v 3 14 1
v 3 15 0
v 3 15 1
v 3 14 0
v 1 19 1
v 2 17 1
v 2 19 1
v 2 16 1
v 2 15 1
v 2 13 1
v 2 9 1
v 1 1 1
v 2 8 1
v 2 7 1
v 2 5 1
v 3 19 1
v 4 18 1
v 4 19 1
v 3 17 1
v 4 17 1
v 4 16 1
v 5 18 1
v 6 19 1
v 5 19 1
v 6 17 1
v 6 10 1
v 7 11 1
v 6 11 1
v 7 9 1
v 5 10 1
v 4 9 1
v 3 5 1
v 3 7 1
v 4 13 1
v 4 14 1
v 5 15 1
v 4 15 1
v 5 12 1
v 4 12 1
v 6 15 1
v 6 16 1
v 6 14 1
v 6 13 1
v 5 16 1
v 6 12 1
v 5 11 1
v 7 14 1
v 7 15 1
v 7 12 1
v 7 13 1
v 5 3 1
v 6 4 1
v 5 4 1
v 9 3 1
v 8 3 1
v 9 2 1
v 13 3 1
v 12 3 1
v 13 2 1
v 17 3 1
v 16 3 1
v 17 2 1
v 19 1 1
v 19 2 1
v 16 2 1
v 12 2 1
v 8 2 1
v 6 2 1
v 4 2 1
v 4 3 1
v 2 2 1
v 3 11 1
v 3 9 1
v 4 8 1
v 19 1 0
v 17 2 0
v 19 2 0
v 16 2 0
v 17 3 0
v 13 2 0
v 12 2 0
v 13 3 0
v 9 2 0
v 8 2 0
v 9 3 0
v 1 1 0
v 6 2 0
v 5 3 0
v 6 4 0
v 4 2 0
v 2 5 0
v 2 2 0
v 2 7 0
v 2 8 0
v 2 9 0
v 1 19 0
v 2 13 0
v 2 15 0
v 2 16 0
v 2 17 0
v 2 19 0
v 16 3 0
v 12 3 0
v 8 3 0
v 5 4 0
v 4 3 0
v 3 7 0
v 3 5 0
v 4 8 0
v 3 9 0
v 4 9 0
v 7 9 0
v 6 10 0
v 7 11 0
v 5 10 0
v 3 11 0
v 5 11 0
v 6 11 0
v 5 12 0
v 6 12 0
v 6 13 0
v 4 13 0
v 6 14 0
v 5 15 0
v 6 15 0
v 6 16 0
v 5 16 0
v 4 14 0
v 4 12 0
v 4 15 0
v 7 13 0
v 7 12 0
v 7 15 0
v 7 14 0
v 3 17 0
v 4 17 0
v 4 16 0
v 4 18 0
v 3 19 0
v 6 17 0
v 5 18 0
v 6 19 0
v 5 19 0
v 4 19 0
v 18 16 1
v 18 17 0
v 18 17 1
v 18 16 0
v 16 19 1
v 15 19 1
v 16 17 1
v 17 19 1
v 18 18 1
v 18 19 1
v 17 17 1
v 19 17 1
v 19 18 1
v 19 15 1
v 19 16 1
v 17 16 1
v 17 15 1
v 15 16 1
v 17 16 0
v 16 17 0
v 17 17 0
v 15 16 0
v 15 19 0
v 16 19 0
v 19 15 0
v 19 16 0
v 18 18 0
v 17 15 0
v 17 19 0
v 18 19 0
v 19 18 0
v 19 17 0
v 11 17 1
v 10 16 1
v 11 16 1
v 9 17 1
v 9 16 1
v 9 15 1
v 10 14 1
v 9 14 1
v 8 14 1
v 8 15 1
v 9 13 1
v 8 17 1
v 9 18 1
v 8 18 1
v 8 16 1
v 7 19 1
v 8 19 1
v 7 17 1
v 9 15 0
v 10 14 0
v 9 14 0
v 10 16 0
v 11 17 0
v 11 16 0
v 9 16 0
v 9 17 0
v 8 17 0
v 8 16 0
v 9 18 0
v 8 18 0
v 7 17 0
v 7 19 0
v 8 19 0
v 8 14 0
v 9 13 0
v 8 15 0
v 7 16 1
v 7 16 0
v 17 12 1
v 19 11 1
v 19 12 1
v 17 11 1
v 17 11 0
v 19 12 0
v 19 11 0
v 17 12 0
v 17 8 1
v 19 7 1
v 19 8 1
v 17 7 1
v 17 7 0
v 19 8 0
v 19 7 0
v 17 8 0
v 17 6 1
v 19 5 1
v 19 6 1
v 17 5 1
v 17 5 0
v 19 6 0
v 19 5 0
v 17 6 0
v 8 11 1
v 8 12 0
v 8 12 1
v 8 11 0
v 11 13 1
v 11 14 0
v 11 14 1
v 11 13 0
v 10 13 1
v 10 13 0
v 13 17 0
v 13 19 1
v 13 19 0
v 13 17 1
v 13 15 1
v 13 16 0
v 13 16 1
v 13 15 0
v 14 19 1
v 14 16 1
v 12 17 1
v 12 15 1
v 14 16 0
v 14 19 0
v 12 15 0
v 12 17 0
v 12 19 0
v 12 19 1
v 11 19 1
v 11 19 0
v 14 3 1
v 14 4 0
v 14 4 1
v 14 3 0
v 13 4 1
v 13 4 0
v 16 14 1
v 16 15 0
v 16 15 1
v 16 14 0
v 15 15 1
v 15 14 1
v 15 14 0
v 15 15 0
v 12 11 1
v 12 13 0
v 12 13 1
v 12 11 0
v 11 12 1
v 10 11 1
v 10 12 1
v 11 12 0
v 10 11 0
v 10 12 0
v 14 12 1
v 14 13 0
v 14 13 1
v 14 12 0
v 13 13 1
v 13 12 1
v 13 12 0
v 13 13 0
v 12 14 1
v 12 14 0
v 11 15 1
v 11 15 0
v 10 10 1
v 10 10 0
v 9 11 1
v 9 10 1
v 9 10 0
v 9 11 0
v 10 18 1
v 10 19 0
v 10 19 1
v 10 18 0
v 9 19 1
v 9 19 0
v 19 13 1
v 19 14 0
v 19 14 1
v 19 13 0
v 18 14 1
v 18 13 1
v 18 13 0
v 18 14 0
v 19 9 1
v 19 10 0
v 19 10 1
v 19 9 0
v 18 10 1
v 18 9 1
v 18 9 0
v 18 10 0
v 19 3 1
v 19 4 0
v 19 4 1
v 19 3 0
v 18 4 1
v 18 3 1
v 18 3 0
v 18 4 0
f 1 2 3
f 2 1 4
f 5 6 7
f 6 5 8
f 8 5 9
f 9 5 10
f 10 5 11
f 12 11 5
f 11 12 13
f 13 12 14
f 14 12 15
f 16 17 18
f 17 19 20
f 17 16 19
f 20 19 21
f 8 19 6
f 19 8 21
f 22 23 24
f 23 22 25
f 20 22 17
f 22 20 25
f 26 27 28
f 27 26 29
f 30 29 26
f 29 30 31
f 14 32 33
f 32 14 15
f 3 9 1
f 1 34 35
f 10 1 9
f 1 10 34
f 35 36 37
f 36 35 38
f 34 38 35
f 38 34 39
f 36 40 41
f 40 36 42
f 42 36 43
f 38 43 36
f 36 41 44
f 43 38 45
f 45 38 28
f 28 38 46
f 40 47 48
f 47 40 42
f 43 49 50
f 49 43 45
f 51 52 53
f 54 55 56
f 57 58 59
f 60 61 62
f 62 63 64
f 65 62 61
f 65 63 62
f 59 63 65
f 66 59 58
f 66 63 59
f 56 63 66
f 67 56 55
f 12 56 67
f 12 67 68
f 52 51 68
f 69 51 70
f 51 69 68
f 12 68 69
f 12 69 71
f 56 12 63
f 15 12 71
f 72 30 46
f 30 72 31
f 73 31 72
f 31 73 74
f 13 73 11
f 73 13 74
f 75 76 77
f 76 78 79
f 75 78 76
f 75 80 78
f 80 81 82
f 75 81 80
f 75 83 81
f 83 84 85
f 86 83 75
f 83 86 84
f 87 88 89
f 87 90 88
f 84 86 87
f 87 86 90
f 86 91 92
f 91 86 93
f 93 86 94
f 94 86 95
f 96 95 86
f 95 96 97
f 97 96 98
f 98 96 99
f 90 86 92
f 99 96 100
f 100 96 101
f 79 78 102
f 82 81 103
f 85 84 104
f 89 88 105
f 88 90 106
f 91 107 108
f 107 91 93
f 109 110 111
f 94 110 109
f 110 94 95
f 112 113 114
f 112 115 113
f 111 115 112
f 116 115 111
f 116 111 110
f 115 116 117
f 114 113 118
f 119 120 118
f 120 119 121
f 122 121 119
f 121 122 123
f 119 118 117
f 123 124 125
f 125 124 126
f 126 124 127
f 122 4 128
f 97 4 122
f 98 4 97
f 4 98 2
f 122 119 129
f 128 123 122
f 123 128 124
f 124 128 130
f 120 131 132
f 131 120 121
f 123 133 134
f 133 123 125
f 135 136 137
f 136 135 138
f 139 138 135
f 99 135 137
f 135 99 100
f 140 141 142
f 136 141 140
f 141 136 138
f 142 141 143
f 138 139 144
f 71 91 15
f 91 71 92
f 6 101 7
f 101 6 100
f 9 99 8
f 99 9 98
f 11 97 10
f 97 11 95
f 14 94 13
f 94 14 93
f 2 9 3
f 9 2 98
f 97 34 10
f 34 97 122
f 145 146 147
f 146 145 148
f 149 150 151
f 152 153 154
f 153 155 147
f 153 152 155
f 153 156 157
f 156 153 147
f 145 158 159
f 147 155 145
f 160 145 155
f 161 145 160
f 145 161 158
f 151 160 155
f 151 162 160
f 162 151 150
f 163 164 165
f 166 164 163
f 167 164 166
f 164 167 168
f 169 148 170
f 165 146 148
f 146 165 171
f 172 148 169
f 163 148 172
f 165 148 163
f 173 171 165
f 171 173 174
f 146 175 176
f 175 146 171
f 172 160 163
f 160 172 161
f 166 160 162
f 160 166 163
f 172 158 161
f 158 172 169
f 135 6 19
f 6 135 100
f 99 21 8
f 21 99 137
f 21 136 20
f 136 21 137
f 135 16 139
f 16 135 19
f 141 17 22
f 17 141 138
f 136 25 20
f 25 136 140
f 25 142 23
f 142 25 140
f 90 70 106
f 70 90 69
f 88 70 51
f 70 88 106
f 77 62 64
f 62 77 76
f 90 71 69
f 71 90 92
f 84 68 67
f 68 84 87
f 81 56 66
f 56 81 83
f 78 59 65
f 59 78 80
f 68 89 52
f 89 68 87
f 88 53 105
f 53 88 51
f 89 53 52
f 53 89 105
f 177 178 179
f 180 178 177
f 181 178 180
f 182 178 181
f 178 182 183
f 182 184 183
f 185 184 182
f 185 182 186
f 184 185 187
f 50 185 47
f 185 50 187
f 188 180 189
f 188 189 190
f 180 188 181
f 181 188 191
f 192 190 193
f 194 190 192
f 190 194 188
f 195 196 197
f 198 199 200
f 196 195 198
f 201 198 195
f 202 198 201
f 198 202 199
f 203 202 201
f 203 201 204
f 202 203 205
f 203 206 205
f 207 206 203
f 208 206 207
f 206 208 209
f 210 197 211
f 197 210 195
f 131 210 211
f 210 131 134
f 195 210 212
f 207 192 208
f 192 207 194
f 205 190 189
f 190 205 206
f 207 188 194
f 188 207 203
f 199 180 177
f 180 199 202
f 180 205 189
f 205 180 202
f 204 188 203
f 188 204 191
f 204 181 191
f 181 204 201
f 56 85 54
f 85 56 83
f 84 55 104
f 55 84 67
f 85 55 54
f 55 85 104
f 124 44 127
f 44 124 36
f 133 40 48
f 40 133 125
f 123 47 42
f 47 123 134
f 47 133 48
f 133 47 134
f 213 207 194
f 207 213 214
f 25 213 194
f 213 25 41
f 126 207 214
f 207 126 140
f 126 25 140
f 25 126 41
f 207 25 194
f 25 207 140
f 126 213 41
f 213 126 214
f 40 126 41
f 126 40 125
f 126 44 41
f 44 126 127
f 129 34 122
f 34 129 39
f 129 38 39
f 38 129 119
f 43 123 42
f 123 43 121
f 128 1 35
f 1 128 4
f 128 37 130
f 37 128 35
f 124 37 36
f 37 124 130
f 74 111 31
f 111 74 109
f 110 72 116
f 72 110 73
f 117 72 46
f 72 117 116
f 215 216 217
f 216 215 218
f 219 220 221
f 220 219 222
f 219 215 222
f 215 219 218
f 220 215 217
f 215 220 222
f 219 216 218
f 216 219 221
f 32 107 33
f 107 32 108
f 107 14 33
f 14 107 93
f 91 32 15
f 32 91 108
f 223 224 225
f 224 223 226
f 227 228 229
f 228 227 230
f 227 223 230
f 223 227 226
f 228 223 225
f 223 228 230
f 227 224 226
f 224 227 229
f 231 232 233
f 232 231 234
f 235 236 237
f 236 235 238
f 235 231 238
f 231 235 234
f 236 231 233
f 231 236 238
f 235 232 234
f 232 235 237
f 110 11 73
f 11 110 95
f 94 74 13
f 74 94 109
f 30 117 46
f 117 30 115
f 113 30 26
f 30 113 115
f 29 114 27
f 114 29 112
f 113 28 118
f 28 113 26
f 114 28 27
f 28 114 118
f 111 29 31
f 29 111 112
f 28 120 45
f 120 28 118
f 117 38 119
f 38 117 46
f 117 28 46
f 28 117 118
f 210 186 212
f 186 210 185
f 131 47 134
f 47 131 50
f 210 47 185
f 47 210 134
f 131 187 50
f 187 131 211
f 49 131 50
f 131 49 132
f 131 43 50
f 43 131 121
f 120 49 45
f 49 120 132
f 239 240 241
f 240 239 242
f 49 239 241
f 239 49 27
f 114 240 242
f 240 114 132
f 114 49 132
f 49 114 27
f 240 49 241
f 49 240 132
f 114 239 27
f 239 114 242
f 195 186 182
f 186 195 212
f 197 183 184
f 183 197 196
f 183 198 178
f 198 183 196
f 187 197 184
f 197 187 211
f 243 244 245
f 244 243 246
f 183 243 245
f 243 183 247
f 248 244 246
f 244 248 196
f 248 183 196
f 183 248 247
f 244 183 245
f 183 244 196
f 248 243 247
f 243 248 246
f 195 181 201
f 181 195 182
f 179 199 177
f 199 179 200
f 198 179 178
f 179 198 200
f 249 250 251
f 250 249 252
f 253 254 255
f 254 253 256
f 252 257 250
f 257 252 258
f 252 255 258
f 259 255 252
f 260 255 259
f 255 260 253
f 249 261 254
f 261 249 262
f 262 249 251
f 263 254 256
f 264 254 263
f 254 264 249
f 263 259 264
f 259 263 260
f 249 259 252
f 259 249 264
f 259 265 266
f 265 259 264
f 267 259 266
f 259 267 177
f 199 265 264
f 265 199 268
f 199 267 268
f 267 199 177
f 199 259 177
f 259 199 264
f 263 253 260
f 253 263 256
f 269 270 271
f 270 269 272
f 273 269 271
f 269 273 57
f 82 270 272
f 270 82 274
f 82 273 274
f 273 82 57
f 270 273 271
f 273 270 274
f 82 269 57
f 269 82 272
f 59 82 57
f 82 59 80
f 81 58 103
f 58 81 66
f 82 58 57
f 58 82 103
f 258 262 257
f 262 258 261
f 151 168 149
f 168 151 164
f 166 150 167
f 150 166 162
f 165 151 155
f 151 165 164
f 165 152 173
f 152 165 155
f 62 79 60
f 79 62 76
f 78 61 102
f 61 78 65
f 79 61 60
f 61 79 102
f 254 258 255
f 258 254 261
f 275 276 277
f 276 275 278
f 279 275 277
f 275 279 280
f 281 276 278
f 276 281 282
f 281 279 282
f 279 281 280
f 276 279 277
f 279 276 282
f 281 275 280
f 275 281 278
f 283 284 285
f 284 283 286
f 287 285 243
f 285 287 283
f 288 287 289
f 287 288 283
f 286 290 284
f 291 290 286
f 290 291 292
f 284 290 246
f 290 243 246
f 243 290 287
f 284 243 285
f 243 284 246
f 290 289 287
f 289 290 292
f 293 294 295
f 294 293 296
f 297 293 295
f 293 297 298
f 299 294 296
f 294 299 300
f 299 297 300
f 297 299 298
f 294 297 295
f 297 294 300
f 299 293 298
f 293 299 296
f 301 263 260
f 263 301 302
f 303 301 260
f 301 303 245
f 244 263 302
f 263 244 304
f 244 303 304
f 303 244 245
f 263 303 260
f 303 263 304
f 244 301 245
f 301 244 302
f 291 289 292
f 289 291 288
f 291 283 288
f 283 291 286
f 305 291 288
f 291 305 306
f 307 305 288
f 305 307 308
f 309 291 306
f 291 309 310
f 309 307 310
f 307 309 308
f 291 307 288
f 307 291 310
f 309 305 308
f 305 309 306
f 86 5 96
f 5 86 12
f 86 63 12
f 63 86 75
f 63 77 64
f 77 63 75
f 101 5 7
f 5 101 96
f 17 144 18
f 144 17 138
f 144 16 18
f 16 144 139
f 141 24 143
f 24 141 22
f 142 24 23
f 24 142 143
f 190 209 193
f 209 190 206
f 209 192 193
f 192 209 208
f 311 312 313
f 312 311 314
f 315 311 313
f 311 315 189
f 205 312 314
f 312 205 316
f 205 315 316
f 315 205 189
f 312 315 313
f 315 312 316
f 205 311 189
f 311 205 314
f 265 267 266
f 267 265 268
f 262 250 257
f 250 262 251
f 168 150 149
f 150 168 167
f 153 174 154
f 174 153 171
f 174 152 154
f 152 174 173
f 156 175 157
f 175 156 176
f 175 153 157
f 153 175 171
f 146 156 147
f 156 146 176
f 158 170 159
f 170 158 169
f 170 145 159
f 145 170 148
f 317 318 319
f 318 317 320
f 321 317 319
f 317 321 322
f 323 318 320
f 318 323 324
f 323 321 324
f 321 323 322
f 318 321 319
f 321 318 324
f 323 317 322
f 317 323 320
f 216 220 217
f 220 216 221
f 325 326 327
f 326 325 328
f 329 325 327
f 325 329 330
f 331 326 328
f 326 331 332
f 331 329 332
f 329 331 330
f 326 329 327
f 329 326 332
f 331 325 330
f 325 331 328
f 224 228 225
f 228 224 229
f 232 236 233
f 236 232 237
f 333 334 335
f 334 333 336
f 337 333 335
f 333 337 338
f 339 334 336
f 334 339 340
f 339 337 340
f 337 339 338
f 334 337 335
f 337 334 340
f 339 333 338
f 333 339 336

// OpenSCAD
// file: ../../util/bitmap.scad
/*****************************************************************************
 * Module Bitmap Library
 * Modules to create bitmaps of unit squares from 1 or 2 dimensional vectors.
 *****************************************************************************
 * Copyright 2017 Chris Baker
 *
 * This program is free software: you can redistribute it and/or modify
 * it under the terms of the GNU Lesser General Public License as published by
 * the Free Software Foundation, either version 3 of the License, or
 * (at your option) any later version.
 *
 * This program is distributed in the hope that it will be useful,
 * but WITHOUT ANY WARRANTY; without even the implied warranty of
 * MERCHANTABILITY or FITNESS FOR A PARTICULAR PURPOSE.  See the
 * GNU Lesser General Public License for more details.
 *
 * You should have received a copy of the GNU Lesser General Public License
 * along with this program.  If not, see <http://www.gnu.org/licenses/>.
 *****************************************************************************
 * Usage:
 * Include this file with the "use" tag.
 * Depends on compat.scad library.
 *
 * API:
 *   1dbitmap(bitmap, center, expansion, vector_mode)
 *   2dbitmap(bitmap, center, expansion, vector_mode)
 *     Generate a 1 or 2-Dimensional field of modules based on the provided
 *     bitmap vector. See Bitmap Vectors below.
 *     The center flag determines whether to center the bitmap on the origin.
 *     The expansion value actually shrinks each cube in the x and y
 *     dimension by the specified amount.
 *     The vector_mode flag determines whether to create 3D solid geometry
 *     (unit cubes) or 2D vector geometry (squares).
 *
 * Bitmap Vectors:
 *   The bitmap vectors primarily provide boolean information.
 *   A module will be placed where these vectors have a postive value and
 *   skipped where they have a negative value. I.E. 0, -1, false, and undef
 *   are all equivalent and result in a skip. 1 and true are equivalent and
 *   result in a placed 1-unit module.
 *   Further, if the value is an integer it will be treated as a height for
 *   the module, allowing z-maps to be created.
 *   If the value is not an integer or boolean, it will be treated as a color
 *   reference. This can be a string or RGBA vector that will be used to
 *   color the module in the OpenSCAD preview window.
 *   In current versions of OpenSCAD, the color has no effect in the rendered
 *   view or STL output.
 *
 * Vector Mode:
 *   Although OpenSCAD supports generating 2D geometry, there are several
 *   caveats:
 *   - 2D and 3D geometry cannot be mixed
 *   - Extruding 2D geometry causes color information to be lost
 *   - All 2D geometry is projected onto the XY plane when rendering
 *   - Rendering also results in loss of color (same as 3D)
 *   - The SVG exporter is somewhat limited:
 *     - The pixel size of the image is hard-coded in the file
 *     - The title of the image is a generic string
 *     - The color selection for stroke and fill is fixed
 *     - The stroke-width is set to a large value that will cause overlap
 *     - The background is transparent
 *     - Only one path element is created with all of the geometry; there is
 *       no easy way to split up the geometry into multiple logical units.
 *     - These issues can mostly be resolved by hand-editing the file:
 *       - Remove or modify the width and height parameters from the svg
 *         element at the top of the file to provide better scaling.
 *       - Edit the title element at the top of the file to change the title.
 *       - Edit the stroke and fill parameters of the path element (these will
 *         probably be at the end of the file).
 *       - Set the stroke-width parameter for the path element to 0.
 *****************************************************************************/
use <compat.scad>

/*
 * 2dbitmap - Turn a 2D vector into a bitmap of cubes
 *
 * bitmap - 2D vector representing where to place each cube
 *          Value can either be boolean, z-height, or color
 * center - center cubes around the origin
 * expansion - size of gap around each pixel (screendoor)
 * vector_mode - create a 2D vector drawing instead of 3D extrusion
 */
module 2dbitmap(bitmap=[[1,0],[0,1]], center=false, expansion=0, vector_mode=false)
{
	ylen=len(bitmap)-1;

	for (y=[0:ylen]) {
		xlen=len(bitmap[y])-1;
		for (x=[0:xlen])
			translate([x-(center?xlen/2:0),ylen-y-(center?ylen/2:0),0])
				if (is_indexable(bitmap[y][x]))
					color(bitmap[y][x])
						if (vector_mode)
							square([1-expansion,1-expansion], center=center);
						else
							cube([1-expansion,1-expansion,1], center=center);
				else
					if (bitmap[y][x])
						if (vector_mode)
							square([1-expansion,1-expansion], center=center);
						else
							cube([1-expansion,1-expansion,clamp_nonnum(bitmap[y][x])], center=center);
	}
}

module 1dbitmap(bitmap=[1,0,1,0,1], center=false, expansion=0, vector_mode=false)
	2dbitmap([bitmap], center, expansion, vector_mode);

/*
 * Examples
 */

// 1D with z-height
translate([10,0,0]) scale([1,10,1])
	1dbitmap(bitmap=[1,1,0,2,0,0,3], expansion=.1);

// 1D with boolean
translate([-20,0,0]) scale([1,10,1])
	1dbitmap(bitmap=[true,false,true,false,true,true]);

// 2D with z-height
scale([2,2,1])
	2dbitmap(bitmap=[[1,0,2,1],[0,3,3,0],[1,1,0,1]],
		center=true);

// 1D with color
translate([0,-10,0]) scale([1,3,1])
	1dbitmap(bitmap=["red","white","blue",[0,0.3,0,0.5]]);

// 1D with color using 2D-vector-mode
translate([-7,-8,0]) scale([1,2])
	1dbitmap(bitmap=["red",0,"blue",0,"green"], vector_mode=true);
translate([-4.5,-10,0]) scale([1,2])
	1dbitmap(bitmap=["red",0,"blue",0,"green"], vector_mode=true, center=true);
// file: ../../util/bitlib.scad
/*****************************************************************************
 * Bit Manipulation Library
 * Provides some useful bit manipulation functions.
 *****************************************************************************
 * Copyright 2017 Chris Baker
 *
 * This program is free software: you can redistribute it and/or modify
 * it under the terms of the GNU Lesser General Public License as published by
 * the Free Software Foundation, either version 3 of the License, or
 * (at your option) any later version.
 *
 * This program is distributed in the hope that it will be useful,
 * but WITHOUT ANY WARRANTY; without even the implied warranty of
 * MERCHANTABILITY or FITNESS FOR A PARTICULAR PURPOSE.  See the
 * GNU Lesser General Public License for more details.
 *
 * You should have received a copy of the GNU Lesser General Public License
 * along with this program.  If not, see <http://www.gnu.org/licenses/>.
 *****************************************************************************
 * Usage:
 * Include this file with the "use" tag.
 * When run on its own, all echo statements in this
 * library should print "true".
 *
 * API:
 *   bit(v,b)
 *     Return the truth value of the b'th bit of v.
 *
 *   check_bit_size(v,b,signed=false)
 *     Determine whether the value v can be represented
 *     with b bits (b must be positive).
 *     The signed flag indicates whether to include the
 *     sign bit in the determination; otherwise negative
 *     values will result in undef being returned.
 *
 *   xor(a,b)
 *     Return the value of a xor b.
 *     Handles arbitrary size values for a and b.
 *     Handles negative values as expected (a positive
 *     result will be returned unless a and b have
 *     differing signs).
 *
 * TODO:
 *  - Change echos to asserts (future OpenSCAD version)
 *  - Add more functions
 *
 *****************************************************************************/

//Return the truth value of the b'th bit of v
function bit(v,b) =
	((v==undef)||(b==undef)||(b<0))?undef:
	(floor(v / pow(2, b)) % 2)?true:false;

echo("*** bit() testcases ***");
echo(0,bit(0,0)==false);
echo(1,bit(-1,0)==true);
echo(2,bit(1,0)==true);
echo(3,[for (i=[0:63]) bit(0,i)]==[for (i=[0:63]) false]); //0=0...0
echo(4,[for (i=[0:63]) bit(-1,i)]==[for (i=[0:63]) true]); //-1=1...1
echo(5,[for (i=[1:63]) bit(1,i)]==[for (i=[1:63]) false]); //1=0...01
echo(6,[for (i=[0:7]) bit(85,i)?1:0]==[1,0,1,0,1,0,1,0]); //85=01010101
echo(7,[for (i=[0:7]) bit(170,i)?1:0]==[0,1,0,1,0,1,0,1]); //170=10101010
echo(8,[for (i=[0:7]) bit(165,i)?1:0]==[1,0,1,0,0,1,0,1]); //165=10100101
echo(9,[for (i=[0:7]) bit(56,i)?1:0]==[0,0,0,1,1,1,0,0]); //56=00111000
echo(10,[for (i=[0:7]) bit(-3,i)?1:0]==[1,0,1,1,1,1,1,1]); //-3=1...101
//(2^64)=0...01 0...0
echo(11,bit(pow(2,64),64)==true);
echo(12,[for (i=[0:63]) bit(pow(2,64),i)]==[for (i=[0:63]) false]);
echo(13,[for (i=[65:127]) bit(pow(2,64),i)]==[for (i=[1:63]) false]);
//-(2^64)=1...1 0...0
echo(14,[for (i=[0:63]) bit(-pow(2,64),i)]==[for (i=[0:63]) false]);
echo(15,[for (i=[64:127]) bit(-pow(2,64),i)]==[for (i=[0:63]) true]);
echo(16,bit(10,-1)==undef);
echo(17,bit(10,undef)==undef);
echo(18,bit(undef,3)==undef);

//return true if v can be represented in b bits
//if signed flag is set. the result will be adjusted
//to account for the needed sign bit
function check_bit_size(v,b,signed=false) =
	(b<0)?undef:
	(v==undef)?undef:
	(b==0)?false:
	(v==0)?true: //(b>0)
	(signed)?
		(v<0)?(-pow(2,b-1)<(v+1)):
			(pow(2,b-1)>(v+1)):
		(v<0)?undef:
			(pow(2,b)>v);

echo("*** check_bit_size() testcases ***");
echo(0,check_bit_size(-1,2)==undef);
echo(1,check_bit_size(2,-4)==undef);
echo(2,check_bit_size(2,-4,signed=true)==undef);
echo(3,check_bit_size(0,0)==false);
echo(4,check_bit_size(0,1)==true);
echo(5,check_bit_size(1,0)==false);
echo(6,check_bit_size(1,1)==true);
echo(7,check_bit_size(7,3)==true);
echo(8,check_bit_size(8,3)==false);
echo(9,check_bit_size(1,3)==true);
echo(10,check_bit_size(256,8)==false);
echo(11,check_bit_size(255,8)==true);
echo(12,check_bit_size(10,2)==false);
echo(13,check_bit_size(10,4)==true);
echo(14,check_bit_size(-10,2,signed=true)==false);
echo(15,check_bit_size(-10,4,signed=true)==false);
echo(16,check_bit_size(-10,5,signed=true)==true);
echo(17,check_bit_size(-1,0,signed=true)==false);
echo(18,check_bit_size(-1,1,signed=true)==true);
echo(19,check_bit_size(0,0,signed=true)==false);
echo(20,check_bit_size(0,1,signed=true)==true);
echo(21,check_bit_size(-2,2,signed=true)==true);
echo(22,check_bit_size(-3,2,signed=true)==false);
echo(23,check_bit_size(-3,3,signed=true)==true);
echo(24,check_bit_size(-8,3,signed=true)==false);
echo(25,check_bit_size(-8,4,signed=true)==true);
echo(26,check_bit_size(undef,4)==undef);
echo(27,check_bit_size(undef,4,signed=true)==undef);

//return the value of a xor b
//runs recursively until all bits of a and b are exhausted
function xor(a,b,i=0) =
	((a==undef)||(b==undef))?undef:
	let (c=bit(a,i), d=bit(b,i),
		 v=((c||d) && !(c&&d))?pow(2,i):0)
		(check_bit_size(a,i,signed=true) &&
		 check_bit_size(b,i,signed=true))?
			-v: //special case for sign bit
			v+xor(a,b,i+1); //recursively add powers of 2

echo("*** xor() testcases ***");
echo(0,xor(42,0)==42);
echo(1,xor(42,42)==0);
echo(2,xor(169,238)==71); //10101001^11101110=01000111=71
echo(3,xor(238,169)==71);
echo(4,xor(42,238)==196); //00101010^11101110=11000100=196
echo(5,xor(169,42)==131); //10101001^00101010=10000011=131
echo(6,xor(-8,-10)==14); //11000^10110=01110=14
echo(7,xor(-7,-10)==15); //11001^10110=01111=15
echo(8,xor(9,-10)==-1); //01001^10110=11111=-1
echo(9,xor(9,-12)==-3); //01001^10100=11101=-3
echo(10,xor(undef,0)==undef);
// file: ../../util/stringlib.scad
/*****************************************************************************
 * String Manipulation Library
 * Provides some useful string manipulation functions.
 *****************************************************************************
 * Copyright 2017 Chris Baker
 *
 * This program is free software: you can redistribute it and/or modify
 * it under the terms of the GNU Lesser General Public License as published by
 * the Free Software Foundation, either version 3 of the License, or
 * (at your option) any later version.
 *
 * This program is distributed in the hope that it will be useful,
 * but WITHOUT ANY WARRANTY; without even the implied warranty of
 * MERCHANTABILITY or FITNESS FOR A PARTICULAR PURPOSE.  See the
 * GNU Lesser General Public License for more details.
 *
 * You should have received a copy of the GNU Lesser General Public License
 * along with this program.  If not, see <http://www.gnu.org/licenses/>.
 *****************************************************************************
 * Usage:
 * Include this file with the "use" tag.
 * When run on its own, all echo statements in this library should print
 * "true".
 *
 * API:
 *   atoi(a)
 *     Convert the string of numerals, a, to a vector of individual decimal
 *     numbers.
 *
 *   ascii_to_vec(a)
 *     Convert the ASCII string, a, into a vector of decimal numbers.
 *
 * TODO:
 *  - Change echos to asserts (future OpenSCAD version)
 *
 *****************************************************************************/

/*
 * atoi - convert ASCII numerals to a vector of individual decimal numbers
 *
 * a - the ASCII string of numerals
 */
function atoi(a) = (len(a)==undef)?undef:
[
	let (val = search(a, "0123456789"))
		for (i = val) i
];

echo("*** atoi() testcases ***");
echo(ascii_to_vec(undef)==undef);
echo(ascii_to_vec(true)==undef);
echo(ascii_to_vec(false)==undef);
echo(ascii_to_vec("")==[]);
echo(atoi("0")==[0]);
echo(atoi("1")==[1]);
echo(atoi("2")==[2]);
echo(atoi("3")==[3]);
echo(atoi("4")==[4]);
echo(atoi("5")==[5]);
echo(atoi("6")==[6]);
echo(atoi("7")==[7]);
echo(atoi("8")==[8]);
echo(atoi("9")==[9]);
echo(atoi("123")==[1,2,3]);
echo(atoi("1a23b")==[1,2,3]); //degenerate case, don't really care too much about the result

/*
 * ascii_to_vec - convert ASCII string to decimal vector
 *
 * a - the ASCII string to vectorize
 */
function ascii_to_vec(a) = (len(a)==undef)?undef:
[
	let (val = search(a, "\x01\x02\x03\x04\x05\x06\x07\x08\x09\x0a\x0b\x0c\x0d\x0e\x0f\x10\x11\x12\x13\x14\x15\x16\x17\x18\x19\x1a\x1b\x1c\x1d\x1e\x1f !\"#$%&'()*+,-./0123456789:;<=>?@ABCDEFGHIJKLMNOPQRSTUVWXYZ[\\]^_`abcdefghijklmnopqrstuvwxyz{|}~\x7f"))
		for (i = val) i+1
];

echo("*** ascii_to_vec() testcases ***");
echo(ascii_to_vec(undef)==undef);
echo(ascii_to_vec(true)==undef);
echo(ascii_to_vec(false)==undef);
echo(ascii_to_vec("")==[]);
echo(ascii_to_vec("0")==[48]);
echo(ascii_to_vec("a")==[97]);
echo(ascii_to_vec("0123456789")==[48,49,50,51,52,53,54,55,56,57]);
echo(ascii_to_vec("The quick brown fox jumped over the lazy dog.")
	==[84,104,101,32,113,117,105,99,107,32,98,114,111,119,110,32,102,111,120,32,106,117,109,112,101,100,32,111,118,101,114,32,116,104,101,32,108,97,122,121,32,100,111,103,46]);
// main file
/* Unit Test 06: 18x18 - 18 data bytes, 14 ecc bytes */
use <../datamatrix.scad>
data_matrix(dm_ascii("Hourez Jonathan"), mark="black");
